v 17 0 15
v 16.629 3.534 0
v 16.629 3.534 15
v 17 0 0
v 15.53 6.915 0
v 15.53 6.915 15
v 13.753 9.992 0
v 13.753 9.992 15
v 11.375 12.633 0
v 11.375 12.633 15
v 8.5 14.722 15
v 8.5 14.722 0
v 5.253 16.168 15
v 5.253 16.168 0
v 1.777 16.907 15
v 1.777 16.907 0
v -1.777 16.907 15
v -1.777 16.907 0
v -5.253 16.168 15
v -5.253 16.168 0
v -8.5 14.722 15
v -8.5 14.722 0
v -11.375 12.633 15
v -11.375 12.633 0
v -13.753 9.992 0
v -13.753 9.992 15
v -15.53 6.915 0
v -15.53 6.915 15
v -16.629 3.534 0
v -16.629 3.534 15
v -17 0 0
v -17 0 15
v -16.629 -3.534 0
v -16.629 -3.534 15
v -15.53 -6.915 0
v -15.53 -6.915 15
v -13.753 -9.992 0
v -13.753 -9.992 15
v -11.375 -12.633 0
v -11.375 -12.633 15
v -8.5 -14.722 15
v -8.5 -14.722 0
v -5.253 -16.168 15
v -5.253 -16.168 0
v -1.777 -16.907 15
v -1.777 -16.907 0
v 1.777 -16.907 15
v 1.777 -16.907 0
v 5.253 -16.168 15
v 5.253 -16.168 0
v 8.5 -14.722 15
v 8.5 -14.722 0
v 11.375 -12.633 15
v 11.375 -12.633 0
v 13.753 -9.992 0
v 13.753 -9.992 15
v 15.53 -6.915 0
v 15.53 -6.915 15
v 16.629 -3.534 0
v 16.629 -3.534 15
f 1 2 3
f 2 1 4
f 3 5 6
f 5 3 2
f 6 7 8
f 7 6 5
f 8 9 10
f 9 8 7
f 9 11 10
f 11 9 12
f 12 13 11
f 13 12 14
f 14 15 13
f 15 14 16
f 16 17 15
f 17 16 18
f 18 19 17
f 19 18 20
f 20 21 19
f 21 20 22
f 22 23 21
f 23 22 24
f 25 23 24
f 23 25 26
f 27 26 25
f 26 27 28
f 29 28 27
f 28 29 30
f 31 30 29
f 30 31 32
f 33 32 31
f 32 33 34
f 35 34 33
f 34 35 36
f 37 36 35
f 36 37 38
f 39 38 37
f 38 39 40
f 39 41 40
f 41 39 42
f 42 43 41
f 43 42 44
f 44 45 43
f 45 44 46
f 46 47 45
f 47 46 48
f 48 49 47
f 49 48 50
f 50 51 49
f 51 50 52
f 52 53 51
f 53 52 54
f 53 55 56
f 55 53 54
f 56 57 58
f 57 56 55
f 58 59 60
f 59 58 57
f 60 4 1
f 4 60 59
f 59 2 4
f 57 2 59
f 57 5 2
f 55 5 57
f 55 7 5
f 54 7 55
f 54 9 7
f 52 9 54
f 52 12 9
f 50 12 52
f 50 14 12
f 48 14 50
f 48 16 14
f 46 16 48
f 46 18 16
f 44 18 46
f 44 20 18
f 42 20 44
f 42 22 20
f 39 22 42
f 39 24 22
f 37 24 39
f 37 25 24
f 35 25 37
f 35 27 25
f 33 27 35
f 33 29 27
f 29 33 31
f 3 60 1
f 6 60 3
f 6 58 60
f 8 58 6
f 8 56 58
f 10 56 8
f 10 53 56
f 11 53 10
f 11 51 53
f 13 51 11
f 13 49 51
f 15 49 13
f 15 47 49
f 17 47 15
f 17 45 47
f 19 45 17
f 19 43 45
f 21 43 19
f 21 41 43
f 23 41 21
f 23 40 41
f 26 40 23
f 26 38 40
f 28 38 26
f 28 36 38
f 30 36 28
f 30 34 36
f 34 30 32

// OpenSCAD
// Generated by SolidPython 1.0.1 on 2020-07-29 00:39:25


cylinder(h = 15, r1 = 17, r2 = 17);
/***********************************************
*********      SolidPython code:      **********
************************************************
 
# import packages: SolidPython
from solid import *
from solid.utils import *
from itertools import chain, combinations


class Resize:

    def __init__(self, scad_file):
        self.scad_file = scad_file
        #self.scad_file = import_scad(scad_file)
        # cone/cylinder param:
        self.r1 = 0
        self.r2 = 0
        self.h = 0
        # rectangular prism param:
        self.w = 0
        self.l = 0
        # ellipse param:
        self.r = 0

    # import OpenScad code (file name corresponds to shape)


    # classify shape + parameters
    def assign(self, param1, param2, param3):
        if self.scad_file == 'cone.scad':
            self.r1 = param1
            self.r2 = param2
            self.h = param3
        elif self.scad_file == 'cylinder.scad':
            self.r1 = param1
            self.r2 = param2
            self.h = param3
        elif self.scad_file == 'rectangularPrism.scad':
            self.h = param1
            self.l = param2
            self.w = param3
        else:
            self.r = param1
            self.h = param2

    # resize parameters
    def iterate(self):
        x = range(3, 20, 2)
        i = 1
        if self.scad_file == 'cone.scad':
            tempList = list(combinations(x, 2))
            for temp in tempList:
                param1 = temp[0]
                param2 = temp[1]
                filepath = 'produced_scad_files/' + 'cone' + str(param1) + '_' + str(param2) + '_' + '.scad'
                scad_render_to_file(cylinder(h=param1, r1=param2, r2=0), filepath)

        elif self.scad_file == 'cylinder.scad':
            tempList = list(combinations(x, 3))
            for temp in tempList:
                param1 = temp[0]
                param2 = temp[1]
                filepath = 'produced_scad_files/' + 'cylinder' + str(param1) + '_' + str(param2) + '_' + '.scad'
                scad_render_to_file(cylinder(h=param1, r1=param2, r2=param2), filepath)

        elif self.scad_file == 'rectangularPrism.scad':
            tempList = list(combinations(x, 3))
            for temp in tempList:
                param1 = temp[0]
                param2 = temp[1]
                param3 = temp[2]
                filepath = 'produced_scad_files/' + 'rectangularPrism' + str(param1) + '_' + str(param2) + '_' + str(
                    param3) + '.scad'
                scad_render_to_file(cube(size=(param1, param2, param3)), filepath)

        elif self.scad_file == 'ellipse.scad':
            tempList = list(combinations(x, 4))
            for temp in tempList:
                param1 = temp[0]
                param2 = temp[1]
                param3 = temp[2]
                param4 = temp[3]
                filepath = 'produced_scad_files/' + 'ellipse' + str(param1) + '_' + str(param2) + '_' + str(param3) + '_' + str(param4) + '.scad'
                scad_render_to_file(scale([param1, param2, param3])(sphere(r=param4)), filepath)

    def render_to_scadfile(self):
        scad_render_to_file(scad, 'example.scad') 
 
************************************************/
